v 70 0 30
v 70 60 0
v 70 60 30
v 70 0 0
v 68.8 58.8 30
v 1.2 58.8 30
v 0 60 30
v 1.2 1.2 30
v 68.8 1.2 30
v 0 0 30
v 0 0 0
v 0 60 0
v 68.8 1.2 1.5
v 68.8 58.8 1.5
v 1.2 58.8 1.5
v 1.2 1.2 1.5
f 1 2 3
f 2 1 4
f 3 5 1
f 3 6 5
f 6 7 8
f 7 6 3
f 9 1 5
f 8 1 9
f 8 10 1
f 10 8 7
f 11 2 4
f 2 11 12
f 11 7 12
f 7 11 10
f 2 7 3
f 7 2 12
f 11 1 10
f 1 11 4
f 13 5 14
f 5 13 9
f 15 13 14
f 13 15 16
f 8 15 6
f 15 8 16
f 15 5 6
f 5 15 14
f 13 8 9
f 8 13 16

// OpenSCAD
$fn = 32;

// ----------------------------------------------------------------------
// Open box: 1.2 mm walls
// ----------------------------------------------------------------------

// --- parameters (mm) ---
box_l = 70;               // outer length, X
box_w = 60;               // outer width, Y
box_h = 30;               // outer height, Z
wall = 1.2;               // wall thickness
floor = 1.5;              // floor thickness

difference() {
  cube([box_l, box_w, box_h]);
  translate([wall, wall, floor])
    cube([box_l - 2 * wall, box_w - 2 * wall, box_h]);
}
